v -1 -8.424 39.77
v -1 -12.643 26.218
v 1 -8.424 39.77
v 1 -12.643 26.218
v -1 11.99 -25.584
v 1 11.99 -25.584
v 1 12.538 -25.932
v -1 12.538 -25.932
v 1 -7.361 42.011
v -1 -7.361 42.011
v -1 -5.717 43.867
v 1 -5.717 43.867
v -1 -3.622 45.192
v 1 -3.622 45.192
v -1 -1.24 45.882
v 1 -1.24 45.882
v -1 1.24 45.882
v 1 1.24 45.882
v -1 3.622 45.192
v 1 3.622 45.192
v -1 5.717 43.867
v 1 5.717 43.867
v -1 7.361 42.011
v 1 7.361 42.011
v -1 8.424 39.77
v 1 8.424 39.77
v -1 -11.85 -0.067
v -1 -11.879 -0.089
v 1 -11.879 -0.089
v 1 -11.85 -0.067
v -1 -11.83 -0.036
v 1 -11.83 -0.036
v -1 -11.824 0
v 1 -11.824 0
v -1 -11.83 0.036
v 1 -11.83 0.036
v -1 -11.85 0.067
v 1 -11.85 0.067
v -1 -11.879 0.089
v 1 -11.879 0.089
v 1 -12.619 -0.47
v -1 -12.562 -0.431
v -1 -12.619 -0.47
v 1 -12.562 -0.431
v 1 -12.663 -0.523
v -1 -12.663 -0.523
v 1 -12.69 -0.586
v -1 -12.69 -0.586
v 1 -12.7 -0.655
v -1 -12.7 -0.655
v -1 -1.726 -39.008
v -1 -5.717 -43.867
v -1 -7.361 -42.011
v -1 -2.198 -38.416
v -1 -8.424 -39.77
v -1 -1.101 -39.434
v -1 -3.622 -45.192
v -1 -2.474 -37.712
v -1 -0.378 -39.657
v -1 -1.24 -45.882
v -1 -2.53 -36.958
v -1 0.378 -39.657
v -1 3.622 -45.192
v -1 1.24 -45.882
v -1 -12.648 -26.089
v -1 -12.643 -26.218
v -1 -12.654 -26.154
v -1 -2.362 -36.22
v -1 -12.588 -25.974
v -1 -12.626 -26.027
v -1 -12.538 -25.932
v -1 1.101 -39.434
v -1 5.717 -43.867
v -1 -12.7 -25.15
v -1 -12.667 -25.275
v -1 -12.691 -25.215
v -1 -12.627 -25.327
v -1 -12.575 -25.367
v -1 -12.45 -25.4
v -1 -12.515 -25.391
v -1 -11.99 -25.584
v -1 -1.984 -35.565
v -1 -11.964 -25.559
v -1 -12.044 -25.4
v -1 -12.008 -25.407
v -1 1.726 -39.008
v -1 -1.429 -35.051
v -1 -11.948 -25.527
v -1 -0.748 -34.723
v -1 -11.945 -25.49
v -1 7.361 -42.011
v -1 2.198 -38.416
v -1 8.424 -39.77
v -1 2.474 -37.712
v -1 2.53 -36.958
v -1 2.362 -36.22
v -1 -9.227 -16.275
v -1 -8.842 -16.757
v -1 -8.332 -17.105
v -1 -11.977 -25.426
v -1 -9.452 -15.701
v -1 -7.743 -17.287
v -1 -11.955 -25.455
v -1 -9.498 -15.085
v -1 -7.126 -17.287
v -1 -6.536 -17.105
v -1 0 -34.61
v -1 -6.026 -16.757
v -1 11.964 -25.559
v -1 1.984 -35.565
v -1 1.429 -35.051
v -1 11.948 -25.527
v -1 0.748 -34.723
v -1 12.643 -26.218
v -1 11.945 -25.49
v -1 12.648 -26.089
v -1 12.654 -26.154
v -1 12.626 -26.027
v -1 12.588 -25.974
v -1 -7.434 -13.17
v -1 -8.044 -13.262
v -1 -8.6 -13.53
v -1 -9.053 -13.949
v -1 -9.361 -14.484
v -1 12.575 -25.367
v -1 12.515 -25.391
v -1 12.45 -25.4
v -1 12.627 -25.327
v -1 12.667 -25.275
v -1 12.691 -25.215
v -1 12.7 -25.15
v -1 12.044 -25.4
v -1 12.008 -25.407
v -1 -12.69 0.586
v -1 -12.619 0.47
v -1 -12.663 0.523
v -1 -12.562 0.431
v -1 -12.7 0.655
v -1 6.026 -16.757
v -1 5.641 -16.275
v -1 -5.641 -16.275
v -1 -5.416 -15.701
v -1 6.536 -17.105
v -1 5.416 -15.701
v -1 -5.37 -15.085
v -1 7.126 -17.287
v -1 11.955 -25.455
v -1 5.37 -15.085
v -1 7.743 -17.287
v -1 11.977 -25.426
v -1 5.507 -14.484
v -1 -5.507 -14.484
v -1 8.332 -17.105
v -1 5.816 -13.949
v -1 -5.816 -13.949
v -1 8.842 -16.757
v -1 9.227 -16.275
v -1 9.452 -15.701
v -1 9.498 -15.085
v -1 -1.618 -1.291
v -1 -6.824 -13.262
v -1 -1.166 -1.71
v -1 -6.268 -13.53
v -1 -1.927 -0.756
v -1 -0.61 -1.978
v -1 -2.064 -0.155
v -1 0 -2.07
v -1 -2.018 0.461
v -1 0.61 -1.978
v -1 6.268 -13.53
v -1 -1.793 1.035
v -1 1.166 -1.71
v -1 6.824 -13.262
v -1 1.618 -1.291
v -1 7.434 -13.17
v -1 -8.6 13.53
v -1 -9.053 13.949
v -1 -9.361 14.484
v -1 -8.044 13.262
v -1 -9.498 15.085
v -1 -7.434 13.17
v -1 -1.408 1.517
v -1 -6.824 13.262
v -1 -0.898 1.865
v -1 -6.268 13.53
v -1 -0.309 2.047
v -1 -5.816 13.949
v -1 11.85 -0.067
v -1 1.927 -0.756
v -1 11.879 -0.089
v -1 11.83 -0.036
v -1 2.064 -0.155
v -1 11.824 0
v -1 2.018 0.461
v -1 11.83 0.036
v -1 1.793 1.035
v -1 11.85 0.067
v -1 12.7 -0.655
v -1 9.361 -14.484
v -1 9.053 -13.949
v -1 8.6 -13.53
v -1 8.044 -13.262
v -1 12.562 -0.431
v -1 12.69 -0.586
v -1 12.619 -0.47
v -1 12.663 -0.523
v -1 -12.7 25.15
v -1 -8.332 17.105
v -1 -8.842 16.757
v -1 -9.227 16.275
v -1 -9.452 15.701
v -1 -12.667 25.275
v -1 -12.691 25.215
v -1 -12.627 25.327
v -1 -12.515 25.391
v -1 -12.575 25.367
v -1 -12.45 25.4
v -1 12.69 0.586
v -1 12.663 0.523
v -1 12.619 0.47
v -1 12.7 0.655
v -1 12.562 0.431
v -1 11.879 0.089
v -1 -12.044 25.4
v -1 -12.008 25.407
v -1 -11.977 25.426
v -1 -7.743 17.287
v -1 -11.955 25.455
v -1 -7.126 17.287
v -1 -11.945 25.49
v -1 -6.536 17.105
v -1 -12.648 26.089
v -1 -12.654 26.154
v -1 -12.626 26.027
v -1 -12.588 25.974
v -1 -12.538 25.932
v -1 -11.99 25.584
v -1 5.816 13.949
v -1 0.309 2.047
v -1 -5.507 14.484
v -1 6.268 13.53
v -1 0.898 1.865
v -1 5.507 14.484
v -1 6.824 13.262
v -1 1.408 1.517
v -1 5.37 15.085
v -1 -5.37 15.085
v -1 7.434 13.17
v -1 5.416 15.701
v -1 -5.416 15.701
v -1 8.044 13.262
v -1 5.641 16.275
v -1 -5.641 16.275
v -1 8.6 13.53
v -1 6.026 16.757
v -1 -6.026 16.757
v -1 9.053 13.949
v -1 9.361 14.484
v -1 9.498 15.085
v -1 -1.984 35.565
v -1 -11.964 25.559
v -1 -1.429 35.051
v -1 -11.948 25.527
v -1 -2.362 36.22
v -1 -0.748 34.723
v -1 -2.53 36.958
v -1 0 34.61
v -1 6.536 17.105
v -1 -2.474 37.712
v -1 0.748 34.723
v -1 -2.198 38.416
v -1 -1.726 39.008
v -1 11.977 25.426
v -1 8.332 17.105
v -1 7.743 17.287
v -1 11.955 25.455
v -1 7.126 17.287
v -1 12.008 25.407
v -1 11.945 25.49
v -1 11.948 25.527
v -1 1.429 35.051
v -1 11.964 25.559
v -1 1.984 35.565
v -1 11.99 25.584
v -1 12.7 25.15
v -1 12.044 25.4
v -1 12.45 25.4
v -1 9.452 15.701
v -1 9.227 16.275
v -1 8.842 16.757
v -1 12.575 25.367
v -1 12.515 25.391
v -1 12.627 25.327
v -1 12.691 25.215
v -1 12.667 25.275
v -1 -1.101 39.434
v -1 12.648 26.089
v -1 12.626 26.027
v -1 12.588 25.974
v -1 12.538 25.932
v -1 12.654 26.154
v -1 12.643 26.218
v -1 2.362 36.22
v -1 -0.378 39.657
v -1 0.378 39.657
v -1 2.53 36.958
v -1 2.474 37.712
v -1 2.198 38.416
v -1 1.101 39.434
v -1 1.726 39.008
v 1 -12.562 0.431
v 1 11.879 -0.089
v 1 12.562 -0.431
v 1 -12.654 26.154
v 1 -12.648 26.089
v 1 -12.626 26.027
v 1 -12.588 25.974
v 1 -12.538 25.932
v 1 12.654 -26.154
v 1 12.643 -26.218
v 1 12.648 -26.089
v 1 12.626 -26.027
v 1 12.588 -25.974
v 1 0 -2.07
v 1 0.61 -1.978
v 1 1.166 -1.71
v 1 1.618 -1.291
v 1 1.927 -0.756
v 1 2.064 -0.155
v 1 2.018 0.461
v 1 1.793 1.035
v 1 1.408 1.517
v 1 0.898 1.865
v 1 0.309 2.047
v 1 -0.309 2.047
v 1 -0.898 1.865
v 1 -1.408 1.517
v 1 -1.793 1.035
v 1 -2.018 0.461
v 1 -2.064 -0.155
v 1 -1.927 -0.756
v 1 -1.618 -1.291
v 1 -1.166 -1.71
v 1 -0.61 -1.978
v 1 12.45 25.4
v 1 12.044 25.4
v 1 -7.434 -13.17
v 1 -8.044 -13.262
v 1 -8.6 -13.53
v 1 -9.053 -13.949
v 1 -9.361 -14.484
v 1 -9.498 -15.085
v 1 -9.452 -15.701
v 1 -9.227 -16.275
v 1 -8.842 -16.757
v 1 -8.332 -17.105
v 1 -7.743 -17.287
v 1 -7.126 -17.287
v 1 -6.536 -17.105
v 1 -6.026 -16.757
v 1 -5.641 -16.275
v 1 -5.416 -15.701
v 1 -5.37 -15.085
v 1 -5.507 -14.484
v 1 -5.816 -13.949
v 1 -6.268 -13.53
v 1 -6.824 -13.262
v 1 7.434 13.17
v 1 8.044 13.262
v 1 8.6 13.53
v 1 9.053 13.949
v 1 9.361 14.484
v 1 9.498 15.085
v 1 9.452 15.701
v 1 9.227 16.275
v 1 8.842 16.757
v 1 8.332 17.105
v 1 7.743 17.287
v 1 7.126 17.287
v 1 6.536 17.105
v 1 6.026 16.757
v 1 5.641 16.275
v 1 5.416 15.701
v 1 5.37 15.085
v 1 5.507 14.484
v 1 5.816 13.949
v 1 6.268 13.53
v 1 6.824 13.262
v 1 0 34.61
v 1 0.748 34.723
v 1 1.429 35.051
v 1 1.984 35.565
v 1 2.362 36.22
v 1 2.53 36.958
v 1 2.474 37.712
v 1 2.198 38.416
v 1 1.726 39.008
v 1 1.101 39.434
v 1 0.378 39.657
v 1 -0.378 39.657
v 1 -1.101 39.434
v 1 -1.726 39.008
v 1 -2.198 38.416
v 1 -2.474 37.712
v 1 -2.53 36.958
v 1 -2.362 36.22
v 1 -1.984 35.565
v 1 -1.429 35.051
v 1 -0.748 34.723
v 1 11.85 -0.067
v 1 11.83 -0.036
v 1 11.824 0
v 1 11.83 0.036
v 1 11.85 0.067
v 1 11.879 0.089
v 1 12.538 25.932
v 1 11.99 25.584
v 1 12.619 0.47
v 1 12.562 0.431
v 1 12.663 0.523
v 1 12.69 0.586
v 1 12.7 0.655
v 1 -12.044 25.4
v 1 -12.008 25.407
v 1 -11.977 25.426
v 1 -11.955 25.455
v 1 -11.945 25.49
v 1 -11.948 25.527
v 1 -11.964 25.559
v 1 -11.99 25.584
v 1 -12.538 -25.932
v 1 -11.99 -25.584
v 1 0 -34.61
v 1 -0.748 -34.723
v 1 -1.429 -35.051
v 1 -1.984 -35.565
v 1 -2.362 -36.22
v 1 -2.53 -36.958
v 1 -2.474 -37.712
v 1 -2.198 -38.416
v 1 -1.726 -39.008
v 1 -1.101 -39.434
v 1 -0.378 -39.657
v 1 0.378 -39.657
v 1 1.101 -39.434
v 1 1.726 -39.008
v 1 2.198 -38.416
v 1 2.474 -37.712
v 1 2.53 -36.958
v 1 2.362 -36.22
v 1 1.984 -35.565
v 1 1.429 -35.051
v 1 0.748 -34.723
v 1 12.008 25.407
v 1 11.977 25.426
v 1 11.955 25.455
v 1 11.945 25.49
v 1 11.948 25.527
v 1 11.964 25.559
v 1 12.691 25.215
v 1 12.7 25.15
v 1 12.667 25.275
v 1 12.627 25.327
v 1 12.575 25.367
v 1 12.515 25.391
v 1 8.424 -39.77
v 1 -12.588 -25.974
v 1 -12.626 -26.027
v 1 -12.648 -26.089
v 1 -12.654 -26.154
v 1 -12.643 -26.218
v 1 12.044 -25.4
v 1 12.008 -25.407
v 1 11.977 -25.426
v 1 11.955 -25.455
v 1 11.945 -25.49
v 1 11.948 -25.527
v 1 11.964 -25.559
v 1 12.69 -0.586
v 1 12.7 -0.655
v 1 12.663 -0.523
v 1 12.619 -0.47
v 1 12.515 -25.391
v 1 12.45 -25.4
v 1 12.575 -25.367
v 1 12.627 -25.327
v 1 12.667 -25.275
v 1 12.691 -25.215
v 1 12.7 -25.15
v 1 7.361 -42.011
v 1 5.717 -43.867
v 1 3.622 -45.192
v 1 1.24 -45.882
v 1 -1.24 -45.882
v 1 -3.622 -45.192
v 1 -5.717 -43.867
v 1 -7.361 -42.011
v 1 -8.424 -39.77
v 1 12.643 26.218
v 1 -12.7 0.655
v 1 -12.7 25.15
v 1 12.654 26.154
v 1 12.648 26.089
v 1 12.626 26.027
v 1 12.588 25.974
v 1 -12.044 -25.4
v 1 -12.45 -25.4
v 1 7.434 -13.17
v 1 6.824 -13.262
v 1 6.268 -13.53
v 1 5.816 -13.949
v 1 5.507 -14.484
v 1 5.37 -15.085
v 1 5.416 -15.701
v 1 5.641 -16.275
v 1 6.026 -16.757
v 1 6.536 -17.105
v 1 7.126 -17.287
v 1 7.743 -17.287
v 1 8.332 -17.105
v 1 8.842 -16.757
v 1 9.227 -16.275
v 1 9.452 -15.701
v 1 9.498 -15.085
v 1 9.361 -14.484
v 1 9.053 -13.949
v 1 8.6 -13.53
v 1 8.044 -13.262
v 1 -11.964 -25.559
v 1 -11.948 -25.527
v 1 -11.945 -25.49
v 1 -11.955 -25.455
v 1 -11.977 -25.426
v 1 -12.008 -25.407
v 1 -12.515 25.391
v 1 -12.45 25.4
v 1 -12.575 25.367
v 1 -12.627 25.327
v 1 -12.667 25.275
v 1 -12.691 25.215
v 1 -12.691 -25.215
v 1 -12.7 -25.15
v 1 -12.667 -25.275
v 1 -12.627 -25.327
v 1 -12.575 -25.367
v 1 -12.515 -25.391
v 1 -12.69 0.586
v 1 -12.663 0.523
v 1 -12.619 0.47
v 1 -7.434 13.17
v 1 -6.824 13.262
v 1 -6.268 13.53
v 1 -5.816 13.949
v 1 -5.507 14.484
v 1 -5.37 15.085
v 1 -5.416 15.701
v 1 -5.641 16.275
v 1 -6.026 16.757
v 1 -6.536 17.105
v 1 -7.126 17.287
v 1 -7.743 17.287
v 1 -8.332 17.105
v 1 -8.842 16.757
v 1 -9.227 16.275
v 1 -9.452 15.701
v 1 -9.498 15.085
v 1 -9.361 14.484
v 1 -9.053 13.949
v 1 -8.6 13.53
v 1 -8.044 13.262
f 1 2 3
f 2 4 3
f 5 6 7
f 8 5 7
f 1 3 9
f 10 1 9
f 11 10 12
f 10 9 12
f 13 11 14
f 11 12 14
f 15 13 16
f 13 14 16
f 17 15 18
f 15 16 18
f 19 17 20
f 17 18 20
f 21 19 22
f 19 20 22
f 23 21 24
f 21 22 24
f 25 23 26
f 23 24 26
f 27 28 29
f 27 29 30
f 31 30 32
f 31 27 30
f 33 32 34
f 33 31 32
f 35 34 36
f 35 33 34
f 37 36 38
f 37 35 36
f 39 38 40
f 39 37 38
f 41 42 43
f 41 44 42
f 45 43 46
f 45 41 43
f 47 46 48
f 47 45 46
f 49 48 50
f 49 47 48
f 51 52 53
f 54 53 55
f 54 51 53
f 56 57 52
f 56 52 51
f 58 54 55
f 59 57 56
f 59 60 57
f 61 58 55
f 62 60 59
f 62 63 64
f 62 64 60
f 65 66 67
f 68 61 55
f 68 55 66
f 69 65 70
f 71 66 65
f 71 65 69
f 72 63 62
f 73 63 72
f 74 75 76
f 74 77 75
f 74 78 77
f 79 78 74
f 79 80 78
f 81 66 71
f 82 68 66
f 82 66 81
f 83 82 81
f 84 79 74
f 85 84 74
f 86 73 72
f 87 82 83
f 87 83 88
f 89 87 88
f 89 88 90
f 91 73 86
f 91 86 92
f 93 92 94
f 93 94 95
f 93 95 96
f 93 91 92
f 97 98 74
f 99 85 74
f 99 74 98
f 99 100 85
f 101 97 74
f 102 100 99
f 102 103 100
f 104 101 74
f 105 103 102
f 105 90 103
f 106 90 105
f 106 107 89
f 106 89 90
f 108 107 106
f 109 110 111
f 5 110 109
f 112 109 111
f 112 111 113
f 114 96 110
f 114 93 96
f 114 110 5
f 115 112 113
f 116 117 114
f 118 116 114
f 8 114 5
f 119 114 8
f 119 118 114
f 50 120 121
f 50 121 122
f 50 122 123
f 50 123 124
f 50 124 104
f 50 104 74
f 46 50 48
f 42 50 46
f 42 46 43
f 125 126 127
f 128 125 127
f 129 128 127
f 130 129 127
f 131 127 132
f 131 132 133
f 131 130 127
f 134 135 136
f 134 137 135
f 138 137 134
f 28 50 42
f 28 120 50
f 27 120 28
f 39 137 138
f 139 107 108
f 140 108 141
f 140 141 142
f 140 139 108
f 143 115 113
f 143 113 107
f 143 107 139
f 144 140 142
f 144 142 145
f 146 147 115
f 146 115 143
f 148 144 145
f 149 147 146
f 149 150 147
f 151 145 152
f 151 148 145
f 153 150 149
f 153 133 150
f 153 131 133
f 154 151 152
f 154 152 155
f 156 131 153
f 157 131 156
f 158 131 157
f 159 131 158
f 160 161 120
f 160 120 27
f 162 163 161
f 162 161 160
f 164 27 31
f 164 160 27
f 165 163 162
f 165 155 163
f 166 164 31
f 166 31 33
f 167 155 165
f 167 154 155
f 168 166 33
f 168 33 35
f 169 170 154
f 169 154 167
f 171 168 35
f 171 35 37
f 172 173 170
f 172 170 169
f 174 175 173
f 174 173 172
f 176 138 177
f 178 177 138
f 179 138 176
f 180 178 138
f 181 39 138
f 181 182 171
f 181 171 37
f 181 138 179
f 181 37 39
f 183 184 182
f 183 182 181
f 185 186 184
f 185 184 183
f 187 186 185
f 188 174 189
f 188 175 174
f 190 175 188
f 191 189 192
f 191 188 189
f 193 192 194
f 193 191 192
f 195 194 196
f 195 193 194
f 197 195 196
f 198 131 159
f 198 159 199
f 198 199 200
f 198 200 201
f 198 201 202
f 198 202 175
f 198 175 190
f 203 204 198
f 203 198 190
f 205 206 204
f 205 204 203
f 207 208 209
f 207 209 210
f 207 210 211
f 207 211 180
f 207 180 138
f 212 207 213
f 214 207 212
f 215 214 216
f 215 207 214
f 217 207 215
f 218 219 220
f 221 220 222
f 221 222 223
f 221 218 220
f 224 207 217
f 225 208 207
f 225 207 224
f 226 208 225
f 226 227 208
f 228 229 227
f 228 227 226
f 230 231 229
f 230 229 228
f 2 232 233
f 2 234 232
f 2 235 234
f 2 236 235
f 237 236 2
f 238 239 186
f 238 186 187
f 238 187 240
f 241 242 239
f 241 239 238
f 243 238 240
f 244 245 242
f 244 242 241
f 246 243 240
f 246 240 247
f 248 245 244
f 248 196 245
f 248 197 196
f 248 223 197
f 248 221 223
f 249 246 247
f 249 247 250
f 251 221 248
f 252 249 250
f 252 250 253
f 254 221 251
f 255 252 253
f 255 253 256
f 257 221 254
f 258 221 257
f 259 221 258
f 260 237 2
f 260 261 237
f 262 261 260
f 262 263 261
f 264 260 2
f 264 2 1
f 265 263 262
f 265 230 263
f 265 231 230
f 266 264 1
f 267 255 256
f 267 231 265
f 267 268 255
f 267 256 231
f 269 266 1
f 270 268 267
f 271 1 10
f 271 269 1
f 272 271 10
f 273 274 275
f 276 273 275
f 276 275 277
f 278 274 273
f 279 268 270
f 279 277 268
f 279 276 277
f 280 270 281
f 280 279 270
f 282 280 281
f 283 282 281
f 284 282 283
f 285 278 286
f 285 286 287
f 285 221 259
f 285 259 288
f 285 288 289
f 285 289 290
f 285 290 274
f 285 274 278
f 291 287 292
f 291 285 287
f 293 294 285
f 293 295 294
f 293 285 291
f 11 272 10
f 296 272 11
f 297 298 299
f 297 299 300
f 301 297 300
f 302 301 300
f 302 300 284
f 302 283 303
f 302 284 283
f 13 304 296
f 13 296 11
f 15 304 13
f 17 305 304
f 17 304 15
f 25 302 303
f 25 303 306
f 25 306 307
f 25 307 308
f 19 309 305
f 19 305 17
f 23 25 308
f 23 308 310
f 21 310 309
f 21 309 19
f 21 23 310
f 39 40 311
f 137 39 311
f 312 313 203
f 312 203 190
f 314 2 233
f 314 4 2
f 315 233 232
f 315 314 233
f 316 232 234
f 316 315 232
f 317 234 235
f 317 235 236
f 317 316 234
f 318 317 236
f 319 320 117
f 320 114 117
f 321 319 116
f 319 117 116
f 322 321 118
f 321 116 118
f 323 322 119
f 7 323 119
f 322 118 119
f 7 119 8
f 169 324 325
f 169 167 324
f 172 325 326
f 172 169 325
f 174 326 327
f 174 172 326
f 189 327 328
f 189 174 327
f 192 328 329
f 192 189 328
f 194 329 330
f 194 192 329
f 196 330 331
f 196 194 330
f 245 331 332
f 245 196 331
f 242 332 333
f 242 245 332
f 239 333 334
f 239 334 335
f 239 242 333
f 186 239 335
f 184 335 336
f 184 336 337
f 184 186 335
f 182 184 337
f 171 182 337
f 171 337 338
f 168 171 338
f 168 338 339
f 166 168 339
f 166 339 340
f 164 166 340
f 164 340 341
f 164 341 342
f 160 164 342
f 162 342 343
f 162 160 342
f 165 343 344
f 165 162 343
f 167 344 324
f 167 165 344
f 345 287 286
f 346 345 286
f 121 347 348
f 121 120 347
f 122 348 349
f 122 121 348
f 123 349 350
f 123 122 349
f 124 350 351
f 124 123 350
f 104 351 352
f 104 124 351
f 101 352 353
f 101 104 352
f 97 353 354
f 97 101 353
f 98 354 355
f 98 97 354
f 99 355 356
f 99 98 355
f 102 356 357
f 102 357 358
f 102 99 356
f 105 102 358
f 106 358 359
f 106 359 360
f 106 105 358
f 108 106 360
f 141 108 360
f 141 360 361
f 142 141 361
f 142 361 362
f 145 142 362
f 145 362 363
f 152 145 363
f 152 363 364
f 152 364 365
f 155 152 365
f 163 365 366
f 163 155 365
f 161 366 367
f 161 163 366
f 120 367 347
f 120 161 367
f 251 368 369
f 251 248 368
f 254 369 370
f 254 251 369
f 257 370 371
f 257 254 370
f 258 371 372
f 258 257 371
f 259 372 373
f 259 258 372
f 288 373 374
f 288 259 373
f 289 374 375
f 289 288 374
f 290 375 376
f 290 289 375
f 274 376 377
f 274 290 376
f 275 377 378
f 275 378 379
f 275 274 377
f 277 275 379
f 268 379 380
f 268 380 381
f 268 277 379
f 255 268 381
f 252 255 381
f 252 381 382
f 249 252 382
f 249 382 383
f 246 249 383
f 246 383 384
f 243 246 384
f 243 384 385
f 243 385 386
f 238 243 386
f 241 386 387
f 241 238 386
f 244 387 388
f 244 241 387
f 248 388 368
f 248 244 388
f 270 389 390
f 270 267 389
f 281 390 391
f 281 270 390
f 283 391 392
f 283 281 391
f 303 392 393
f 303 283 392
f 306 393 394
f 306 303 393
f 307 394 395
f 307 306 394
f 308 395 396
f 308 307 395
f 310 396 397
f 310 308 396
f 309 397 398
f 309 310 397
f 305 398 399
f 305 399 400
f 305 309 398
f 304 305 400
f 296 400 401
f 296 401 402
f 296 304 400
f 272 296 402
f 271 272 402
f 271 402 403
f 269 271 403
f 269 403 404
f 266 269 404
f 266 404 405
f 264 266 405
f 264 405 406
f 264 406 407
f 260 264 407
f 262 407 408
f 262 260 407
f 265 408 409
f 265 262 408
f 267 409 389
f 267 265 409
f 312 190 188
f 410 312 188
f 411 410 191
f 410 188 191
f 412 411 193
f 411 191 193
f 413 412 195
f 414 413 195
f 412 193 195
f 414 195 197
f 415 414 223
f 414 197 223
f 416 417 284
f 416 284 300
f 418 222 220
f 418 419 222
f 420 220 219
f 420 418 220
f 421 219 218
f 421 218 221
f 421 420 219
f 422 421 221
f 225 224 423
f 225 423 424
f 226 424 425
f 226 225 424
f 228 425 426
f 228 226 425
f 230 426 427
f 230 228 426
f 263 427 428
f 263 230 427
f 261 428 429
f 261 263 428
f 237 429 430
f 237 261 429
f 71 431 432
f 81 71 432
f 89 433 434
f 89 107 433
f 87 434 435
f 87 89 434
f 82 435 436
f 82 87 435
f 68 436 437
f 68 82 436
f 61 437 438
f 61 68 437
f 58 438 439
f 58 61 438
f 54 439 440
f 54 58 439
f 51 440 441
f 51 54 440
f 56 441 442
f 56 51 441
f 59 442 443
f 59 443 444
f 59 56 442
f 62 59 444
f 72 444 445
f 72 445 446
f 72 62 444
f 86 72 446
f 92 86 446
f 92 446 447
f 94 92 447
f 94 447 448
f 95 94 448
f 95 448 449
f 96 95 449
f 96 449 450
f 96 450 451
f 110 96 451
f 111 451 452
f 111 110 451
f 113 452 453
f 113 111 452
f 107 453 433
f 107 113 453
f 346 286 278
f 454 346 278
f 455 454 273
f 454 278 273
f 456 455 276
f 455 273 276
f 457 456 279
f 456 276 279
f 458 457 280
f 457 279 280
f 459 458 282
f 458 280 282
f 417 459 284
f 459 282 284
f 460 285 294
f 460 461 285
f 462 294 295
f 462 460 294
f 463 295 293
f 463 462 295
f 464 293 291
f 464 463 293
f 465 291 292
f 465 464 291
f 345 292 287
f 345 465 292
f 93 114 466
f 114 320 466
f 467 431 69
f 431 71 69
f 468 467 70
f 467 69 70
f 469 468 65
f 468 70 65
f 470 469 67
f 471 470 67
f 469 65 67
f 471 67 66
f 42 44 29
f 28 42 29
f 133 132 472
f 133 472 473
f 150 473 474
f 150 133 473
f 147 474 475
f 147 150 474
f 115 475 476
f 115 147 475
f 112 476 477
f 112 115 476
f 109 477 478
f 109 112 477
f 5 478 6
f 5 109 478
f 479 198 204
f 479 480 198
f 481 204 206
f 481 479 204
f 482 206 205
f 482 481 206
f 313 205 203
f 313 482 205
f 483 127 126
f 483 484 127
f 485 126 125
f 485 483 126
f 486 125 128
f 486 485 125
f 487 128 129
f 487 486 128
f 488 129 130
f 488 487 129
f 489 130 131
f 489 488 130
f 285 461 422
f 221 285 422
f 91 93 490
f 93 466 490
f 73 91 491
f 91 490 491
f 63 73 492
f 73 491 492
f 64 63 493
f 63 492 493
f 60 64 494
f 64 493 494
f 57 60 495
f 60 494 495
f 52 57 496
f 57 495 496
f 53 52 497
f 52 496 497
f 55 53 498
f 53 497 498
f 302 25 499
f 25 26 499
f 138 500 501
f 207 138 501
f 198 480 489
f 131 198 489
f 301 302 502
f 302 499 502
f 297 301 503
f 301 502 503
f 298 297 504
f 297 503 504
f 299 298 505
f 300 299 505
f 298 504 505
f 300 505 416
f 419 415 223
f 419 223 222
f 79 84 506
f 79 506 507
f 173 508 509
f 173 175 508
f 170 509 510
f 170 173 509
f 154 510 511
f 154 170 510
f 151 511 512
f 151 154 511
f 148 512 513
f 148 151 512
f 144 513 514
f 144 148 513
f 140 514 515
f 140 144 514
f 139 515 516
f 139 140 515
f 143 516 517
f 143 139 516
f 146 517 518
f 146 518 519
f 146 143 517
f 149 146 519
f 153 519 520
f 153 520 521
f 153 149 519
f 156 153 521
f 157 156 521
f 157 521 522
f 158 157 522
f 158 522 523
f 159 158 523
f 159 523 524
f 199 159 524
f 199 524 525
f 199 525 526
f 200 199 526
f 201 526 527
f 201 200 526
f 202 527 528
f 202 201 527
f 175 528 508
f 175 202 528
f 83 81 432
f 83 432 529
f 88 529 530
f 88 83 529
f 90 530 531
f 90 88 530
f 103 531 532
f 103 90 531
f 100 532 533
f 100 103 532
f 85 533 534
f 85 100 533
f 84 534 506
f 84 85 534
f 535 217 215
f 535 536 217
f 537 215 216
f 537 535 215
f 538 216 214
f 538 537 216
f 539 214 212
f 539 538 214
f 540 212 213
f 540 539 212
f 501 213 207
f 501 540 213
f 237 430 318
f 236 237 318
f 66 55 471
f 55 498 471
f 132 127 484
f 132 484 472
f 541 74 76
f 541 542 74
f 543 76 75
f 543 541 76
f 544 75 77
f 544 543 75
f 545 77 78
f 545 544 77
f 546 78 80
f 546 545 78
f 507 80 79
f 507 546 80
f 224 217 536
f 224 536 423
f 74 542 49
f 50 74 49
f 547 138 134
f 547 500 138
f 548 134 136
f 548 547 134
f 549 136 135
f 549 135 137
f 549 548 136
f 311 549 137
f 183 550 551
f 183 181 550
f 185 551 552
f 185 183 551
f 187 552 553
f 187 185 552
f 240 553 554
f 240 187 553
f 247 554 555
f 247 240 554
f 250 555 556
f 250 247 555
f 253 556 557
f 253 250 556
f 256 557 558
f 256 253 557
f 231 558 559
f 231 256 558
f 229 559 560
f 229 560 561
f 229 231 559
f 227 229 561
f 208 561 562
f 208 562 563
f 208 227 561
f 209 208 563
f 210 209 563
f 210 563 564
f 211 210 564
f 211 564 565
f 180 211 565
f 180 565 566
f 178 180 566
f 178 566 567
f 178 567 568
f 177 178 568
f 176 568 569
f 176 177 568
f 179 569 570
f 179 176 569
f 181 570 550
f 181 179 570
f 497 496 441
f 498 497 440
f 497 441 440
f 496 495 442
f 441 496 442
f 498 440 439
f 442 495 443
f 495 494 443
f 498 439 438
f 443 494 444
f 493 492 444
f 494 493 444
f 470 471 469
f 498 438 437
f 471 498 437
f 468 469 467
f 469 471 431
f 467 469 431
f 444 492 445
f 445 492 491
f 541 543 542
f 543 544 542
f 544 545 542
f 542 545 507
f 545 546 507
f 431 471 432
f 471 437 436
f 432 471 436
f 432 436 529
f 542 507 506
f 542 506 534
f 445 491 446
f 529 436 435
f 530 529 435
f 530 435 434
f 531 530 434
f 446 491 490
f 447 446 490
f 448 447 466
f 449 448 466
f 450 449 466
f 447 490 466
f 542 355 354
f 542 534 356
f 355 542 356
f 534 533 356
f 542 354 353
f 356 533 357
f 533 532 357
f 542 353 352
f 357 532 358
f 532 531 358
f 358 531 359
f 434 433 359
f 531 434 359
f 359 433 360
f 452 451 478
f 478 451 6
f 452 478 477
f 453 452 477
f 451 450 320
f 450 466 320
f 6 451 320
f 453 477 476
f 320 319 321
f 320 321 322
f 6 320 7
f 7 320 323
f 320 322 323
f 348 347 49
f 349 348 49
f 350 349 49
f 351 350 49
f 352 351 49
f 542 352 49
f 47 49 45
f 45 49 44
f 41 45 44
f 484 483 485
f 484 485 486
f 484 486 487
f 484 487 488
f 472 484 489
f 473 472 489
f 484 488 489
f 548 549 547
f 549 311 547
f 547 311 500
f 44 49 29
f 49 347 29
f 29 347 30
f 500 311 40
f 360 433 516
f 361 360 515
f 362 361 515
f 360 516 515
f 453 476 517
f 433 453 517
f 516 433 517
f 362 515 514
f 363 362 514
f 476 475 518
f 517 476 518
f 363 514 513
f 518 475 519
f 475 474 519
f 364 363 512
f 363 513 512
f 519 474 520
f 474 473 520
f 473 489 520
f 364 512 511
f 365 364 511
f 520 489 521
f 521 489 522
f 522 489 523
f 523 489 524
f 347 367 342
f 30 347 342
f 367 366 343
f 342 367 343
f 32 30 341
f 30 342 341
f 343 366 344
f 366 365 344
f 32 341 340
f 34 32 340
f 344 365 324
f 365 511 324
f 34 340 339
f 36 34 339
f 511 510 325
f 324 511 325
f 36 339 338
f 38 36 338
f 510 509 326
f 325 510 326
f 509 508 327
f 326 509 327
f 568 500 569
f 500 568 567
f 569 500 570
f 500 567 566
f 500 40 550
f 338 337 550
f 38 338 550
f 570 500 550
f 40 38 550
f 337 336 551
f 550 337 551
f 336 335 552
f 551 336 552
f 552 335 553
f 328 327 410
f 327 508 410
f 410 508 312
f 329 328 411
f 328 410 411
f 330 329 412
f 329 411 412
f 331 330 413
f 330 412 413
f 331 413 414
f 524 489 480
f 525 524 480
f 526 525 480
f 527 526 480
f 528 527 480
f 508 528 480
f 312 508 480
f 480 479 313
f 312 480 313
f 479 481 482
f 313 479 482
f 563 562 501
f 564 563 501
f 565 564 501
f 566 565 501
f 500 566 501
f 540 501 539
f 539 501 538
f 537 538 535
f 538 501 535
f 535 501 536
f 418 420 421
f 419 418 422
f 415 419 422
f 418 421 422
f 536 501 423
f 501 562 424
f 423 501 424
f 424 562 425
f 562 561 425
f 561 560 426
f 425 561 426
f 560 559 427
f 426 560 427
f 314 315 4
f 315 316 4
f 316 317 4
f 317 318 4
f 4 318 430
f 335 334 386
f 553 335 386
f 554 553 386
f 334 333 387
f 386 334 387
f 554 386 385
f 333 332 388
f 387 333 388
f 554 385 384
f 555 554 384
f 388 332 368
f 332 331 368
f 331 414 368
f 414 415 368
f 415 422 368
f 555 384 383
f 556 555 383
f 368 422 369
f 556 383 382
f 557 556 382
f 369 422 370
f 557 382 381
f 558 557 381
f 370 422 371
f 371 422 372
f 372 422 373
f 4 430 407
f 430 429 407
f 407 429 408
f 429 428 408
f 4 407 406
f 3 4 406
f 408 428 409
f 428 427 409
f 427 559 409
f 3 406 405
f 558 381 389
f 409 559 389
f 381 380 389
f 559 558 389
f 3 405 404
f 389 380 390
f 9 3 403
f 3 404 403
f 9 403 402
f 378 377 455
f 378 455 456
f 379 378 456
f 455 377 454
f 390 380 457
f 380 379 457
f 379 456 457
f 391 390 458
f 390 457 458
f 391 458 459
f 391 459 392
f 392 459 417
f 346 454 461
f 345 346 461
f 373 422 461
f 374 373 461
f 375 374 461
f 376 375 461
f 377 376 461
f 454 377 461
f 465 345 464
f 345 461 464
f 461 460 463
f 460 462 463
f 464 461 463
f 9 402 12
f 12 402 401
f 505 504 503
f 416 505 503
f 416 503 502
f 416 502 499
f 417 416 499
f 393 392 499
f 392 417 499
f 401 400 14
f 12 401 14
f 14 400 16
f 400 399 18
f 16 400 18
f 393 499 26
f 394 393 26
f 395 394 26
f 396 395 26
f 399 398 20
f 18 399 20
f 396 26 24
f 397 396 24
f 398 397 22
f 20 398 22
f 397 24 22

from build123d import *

# Parameters (mm, degrees)
SKETCH1_R               = 2.07
SKETCH1_R_2             = 2.5375
BOSS_EXTRUDE1_DEPTH     = 1
CUT_EXTRUDE1_DEPTH      = 48.733959609
CUT_EXTRUDE1_DEPTH_BACK = 48.733959609
FILLET1_R               = 0.250000008


with BuildPart() as part:
    # Sketch1 → Boss-Extrude1 (new, symmetric)
    with BuildSketch(Plane(origin=(0, 0, 0), x_dir=(0, 0, -1), z_dir=(1, 0, 0))):
        with BuildLine():
            Line((-26.035, 12.7), (26.035, 12.7))
            Line((26.035, 12.7), (39.770143518, 8.423671838))
            ThreePointArc((39.770143518, 8.423671838), (45.97, 0), (39.770143518, -8.423671838))
            Line((39.770143518, -8.423671838), (26.035, -12.7))
            Line((26.035, -12.7), (-26.035, -12.7))
            Line((-26.035, -12.7), (-39.770143518, -8.423671838))
            ThreePointArc((-39.770143518, -8.423671838), (-45.97, 0), (-39.770143518, 8.423671838))
            Line((-39.770143518, 8.423671838), (-26.035, 12.7))
        make_face()
        Circle(SKETCH1_R, mode=Mode.SUBTRACT)
        with Locations((-15.24, 7.434146341)):
            Circle(SKETCH1_R, mode=Mode.SUBTRACT)
        with Locations((-15.24, -7.434146341)):
            Circle(SKETCH1_R, mode=Mode.SUBTRACT)
        with Locations(Location((15.24, -7.434146341, 0), (0, 0, 180))):
            Circle(SKETCH1_R, mode=Mode.SUBTRACT)
        with Locations(Location((15.24, 7.434146341, 0), (0, 0, 180))):
            Circle(SKETCH1_R, mode=Mode.SUBTRACT)
        with Locations((-37.1475, 0)):
            Circle(SKETCH1_R_2, mode=Mode.SUBTRACT)
        with Locations(Location((37.1475, 0, 0), (0, 0, 180))):
            Circle(SKETCH1_R_2, mode=Mode.SUBTRACT)
    extrude(amount=BOSS_EXTRUDE1_DEPTH, both=True)

    # Sketch2 → Cut-Extrude1 (cut, two sides: drawn at the far end of the back side and taken through both)
    with BuildSketch(Plane(origin=(1, 0, 0), x_dir=(0, 0, -1), z_dir=(1, 0, 0)).offset(-CUT_EXTRUDE1_DEPTH_BACK)):
        with BuildLine():
            Line((-25.4, 12.7), (-25.4, 12.044028029))
            ThreePointArc((-25.4, 12.044028029), (-25.472087861, 11.948002447), (-25.58441825, 11.99042244))
            Line((-25.58441825, 11.99042244), (-26.035, 12.7))
            Line((-26.035, 12.7), (-25.4, 12.7))
        make_face()
        with BuildLine():
            Line((25.4, 12.7), (25.4, 12.044028029))
            ThreePointArc((25.4, 12.044028029), (25.472087861, 11.948002447), (25.58441825, 11.99042244))
            Line((25.58441825, 11.99042244), (26.035, 12.7))
            Line((26.035, 12.7), (25.4, 12.7))
        make_face()
        with BuildLine():
            Line((25.4, -12.7), (26.035, -12.7))
            Line((26.035, -12.7), (25.58441825, -11.99042244))
            ThreePointArc((25.58441825, -11.99042244), (25.472087861, -11.948002447), (25.4, -12.044028029))
            Line((25.4, -12.044028029), (25.4, -12.7))
        make_face()
        with BuildLine():
            Line((-25.4, -12.7), (-25.4, -12.044028029))
            ThreePointArc((-25.4, -12.044028029), (-25.472087861, -11.948002447), (-25.58441825, -11.99042244))
            Line((-25.58441825, -11.99042244), (-26.035, -12.7))
            Line((-26.035, -12.7), (-25.4, -12.7))
        make_face()
        with BuildLine():
            Line((-0.5, 12.7), (0.5, 12.7))
            Line((0.5, 12.7), (0.089442719, 11.878885438))
            ThreePointArc((0.089442719, 11.878885438), (0, 11.823606798), (-0.089442719, 11.878885438))
            Line((-0.089442719, 11.878885438), (-0.5, 12.7))
        make_face()
        with BuildLine():
            Line((-0.5, -12.7), (0.5, -12.7))
            Line((0.5, -12.7), (0.089442719, -11.878885438))
            ThreePointArc((0.089442719, -11.878885438), (0, -11.823606798), (-0.089442719, -11.878885438))
            Line((-0.089442719, -11.878885438), (-0.5, -12.7))
        make_face()
    extrude(amount=CUT_EXTRUDE1_DEPTH + CUT_EXTRUDE1_DEPTH_BACK, mode=Mode.SUBTRACT)

    # Fillet1
    fillet1_edges = [part.edges().sort_by_distance(p)[0] for p in [
        (0, -12.7, -0.5),
        (0, -12.7, 0.5),
        (0, 12.7, 0.5),
        (0, 12.7, -0.5),
        (0, 12.7, 25.4),
        (0, -12.7, -26.035),
        (0, -12.7, 26.035),
        (0, 12.7, 26.035),
        (0, 12.7, -26.035),
        (0, 12.7, -25.4),
        (0, -12.7, -25.4),
        (0, -12.7, 25.4),
    ]]
    fillet(fillet1_edges, radius=FILLET1_R)


solid = part.part
